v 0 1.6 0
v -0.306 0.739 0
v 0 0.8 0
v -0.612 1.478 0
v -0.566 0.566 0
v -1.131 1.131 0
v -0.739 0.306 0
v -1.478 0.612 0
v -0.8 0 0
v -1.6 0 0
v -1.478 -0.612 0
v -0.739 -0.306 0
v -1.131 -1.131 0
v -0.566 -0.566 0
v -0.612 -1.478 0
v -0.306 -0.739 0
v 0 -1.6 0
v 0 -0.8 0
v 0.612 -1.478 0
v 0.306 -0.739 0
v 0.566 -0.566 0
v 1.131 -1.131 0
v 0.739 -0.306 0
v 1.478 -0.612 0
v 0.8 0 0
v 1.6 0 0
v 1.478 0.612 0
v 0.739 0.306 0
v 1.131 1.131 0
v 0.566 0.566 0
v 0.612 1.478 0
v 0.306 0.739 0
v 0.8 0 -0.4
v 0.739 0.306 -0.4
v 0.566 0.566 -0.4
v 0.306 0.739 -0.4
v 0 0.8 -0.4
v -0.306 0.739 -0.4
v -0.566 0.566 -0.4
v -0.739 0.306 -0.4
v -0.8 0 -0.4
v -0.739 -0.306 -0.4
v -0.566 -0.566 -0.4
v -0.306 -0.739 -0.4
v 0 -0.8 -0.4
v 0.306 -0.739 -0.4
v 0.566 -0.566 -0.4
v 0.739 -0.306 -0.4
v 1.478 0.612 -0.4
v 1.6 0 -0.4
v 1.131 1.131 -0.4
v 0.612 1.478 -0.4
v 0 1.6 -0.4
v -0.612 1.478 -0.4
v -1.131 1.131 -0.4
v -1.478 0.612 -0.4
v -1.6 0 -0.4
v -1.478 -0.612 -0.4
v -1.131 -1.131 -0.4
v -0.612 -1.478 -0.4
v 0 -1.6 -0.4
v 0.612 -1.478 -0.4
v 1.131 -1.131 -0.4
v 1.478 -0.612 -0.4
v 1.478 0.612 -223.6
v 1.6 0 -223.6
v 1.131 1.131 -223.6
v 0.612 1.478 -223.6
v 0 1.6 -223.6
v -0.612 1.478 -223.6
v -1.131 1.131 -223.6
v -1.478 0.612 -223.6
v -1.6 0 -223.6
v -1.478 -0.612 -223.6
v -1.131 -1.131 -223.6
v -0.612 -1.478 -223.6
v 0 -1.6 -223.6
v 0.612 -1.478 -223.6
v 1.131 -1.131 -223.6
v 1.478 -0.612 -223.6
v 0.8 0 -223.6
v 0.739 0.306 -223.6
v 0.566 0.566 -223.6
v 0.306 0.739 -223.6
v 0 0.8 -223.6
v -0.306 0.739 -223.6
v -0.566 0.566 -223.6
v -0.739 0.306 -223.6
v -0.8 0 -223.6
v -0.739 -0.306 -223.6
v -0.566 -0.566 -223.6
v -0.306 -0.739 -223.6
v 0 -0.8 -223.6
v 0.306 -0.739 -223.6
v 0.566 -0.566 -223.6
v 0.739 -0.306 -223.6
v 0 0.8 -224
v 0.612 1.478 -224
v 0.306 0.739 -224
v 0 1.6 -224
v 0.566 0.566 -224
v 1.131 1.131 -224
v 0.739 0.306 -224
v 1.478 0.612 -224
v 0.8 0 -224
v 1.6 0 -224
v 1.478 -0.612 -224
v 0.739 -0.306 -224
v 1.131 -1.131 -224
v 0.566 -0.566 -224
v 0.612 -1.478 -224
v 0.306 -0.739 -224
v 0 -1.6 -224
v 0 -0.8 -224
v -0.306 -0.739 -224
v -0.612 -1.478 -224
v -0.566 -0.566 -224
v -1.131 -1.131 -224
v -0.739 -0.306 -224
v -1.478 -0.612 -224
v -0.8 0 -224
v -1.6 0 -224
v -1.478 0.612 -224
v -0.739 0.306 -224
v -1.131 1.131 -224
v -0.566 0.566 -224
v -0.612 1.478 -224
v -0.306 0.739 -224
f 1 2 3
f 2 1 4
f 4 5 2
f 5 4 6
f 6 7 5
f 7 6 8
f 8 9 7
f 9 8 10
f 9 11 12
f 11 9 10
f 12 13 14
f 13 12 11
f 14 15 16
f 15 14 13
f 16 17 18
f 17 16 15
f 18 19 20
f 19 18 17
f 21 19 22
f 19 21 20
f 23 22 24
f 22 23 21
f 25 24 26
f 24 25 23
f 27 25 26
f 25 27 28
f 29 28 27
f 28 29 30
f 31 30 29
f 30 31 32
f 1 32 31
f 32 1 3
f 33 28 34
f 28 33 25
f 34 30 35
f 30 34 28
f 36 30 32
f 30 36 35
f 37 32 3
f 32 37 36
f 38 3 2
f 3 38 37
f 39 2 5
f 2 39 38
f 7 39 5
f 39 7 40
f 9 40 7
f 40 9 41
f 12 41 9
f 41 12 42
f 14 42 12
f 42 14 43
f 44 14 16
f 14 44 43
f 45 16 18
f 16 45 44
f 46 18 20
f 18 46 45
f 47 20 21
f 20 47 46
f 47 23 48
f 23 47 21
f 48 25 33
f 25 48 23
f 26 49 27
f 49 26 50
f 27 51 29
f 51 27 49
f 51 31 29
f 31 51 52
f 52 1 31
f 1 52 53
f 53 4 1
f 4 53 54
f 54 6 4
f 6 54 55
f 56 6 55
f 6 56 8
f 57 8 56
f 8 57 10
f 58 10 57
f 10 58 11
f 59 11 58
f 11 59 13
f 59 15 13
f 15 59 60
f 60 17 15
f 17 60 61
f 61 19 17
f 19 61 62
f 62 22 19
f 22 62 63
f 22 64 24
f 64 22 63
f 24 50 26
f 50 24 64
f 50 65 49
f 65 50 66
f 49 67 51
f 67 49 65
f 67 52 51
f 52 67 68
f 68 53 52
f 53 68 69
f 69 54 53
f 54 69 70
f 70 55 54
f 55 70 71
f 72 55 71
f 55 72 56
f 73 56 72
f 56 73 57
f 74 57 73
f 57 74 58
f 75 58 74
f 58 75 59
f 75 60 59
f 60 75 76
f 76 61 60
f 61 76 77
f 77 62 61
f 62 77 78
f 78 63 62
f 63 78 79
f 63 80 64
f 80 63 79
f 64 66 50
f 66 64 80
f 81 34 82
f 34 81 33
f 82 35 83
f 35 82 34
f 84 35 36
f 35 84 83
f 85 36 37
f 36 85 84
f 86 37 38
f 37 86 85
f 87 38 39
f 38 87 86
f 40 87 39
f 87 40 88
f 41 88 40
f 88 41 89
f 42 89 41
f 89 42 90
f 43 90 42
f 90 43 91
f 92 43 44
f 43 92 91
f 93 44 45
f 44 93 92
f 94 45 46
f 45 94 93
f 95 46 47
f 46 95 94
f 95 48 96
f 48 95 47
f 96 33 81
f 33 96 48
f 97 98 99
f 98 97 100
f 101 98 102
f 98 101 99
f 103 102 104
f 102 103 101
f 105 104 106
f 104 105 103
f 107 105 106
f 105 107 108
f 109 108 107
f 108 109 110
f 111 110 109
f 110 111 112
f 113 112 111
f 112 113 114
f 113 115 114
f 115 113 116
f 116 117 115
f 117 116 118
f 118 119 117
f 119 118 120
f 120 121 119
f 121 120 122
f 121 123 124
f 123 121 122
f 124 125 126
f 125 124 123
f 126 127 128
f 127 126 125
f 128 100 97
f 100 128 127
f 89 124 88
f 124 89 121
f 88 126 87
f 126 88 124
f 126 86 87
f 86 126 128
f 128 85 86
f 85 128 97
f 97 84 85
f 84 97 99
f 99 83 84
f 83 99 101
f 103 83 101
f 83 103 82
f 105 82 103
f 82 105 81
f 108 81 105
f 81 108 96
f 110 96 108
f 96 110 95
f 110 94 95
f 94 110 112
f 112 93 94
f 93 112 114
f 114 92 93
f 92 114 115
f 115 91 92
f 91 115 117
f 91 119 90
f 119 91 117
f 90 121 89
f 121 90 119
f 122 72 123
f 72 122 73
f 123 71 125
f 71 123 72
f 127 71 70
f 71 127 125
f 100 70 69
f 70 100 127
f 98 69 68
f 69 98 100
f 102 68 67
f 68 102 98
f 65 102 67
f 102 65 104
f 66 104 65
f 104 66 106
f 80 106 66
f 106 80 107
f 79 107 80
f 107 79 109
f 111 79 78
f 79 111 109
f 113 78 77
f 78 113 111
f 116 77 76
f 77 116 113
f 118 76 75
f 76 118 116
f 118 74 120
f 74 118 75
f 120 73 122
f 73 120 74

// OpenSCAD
// file: ../p/4-4ring1.scad
use <../lib.scad>
function ldraw_lib__4_4ring1() = [
// 0 Ring  1 x 1.0
// 0 Name: 4-4ring1.dat
// 0 Author: James Jessiman
// 0 !LDRAW_ORG Primitive UPDATE 2009-01
// 0 !LICENSE Licensed under CC BY 4.0 : see CAreadme.txt
// 
// 0 BFC CERTIFY CCW
  [0,"BFC","CERTIFY"],
  [0,"BFC","CCW"],
// 
// 0 !HISTORY 1998-12-15 [PTadmin] Official Update 1998-10
// 0 !HISTORY 2002-04-08 [BrickCaster] Modified for BFC compliance
// 0 !HISTORY 2002-04-25 [PTadmin] Official Update 2002-02
// 0 !HISTORY 2007-06-24 [PTadmin] Header formatted for Contributor Agreement
// 0 !HISTORY 2008-07-01 [PTadmin] Official Update 2008-01
// 0 !HISTORY 2008-08-26 [cwdee] Switch polygon winding and rename
// 0 !HISTORY 2009-05-02 [PTadmin] Official Update 2009-01
// 
// 
// 4 16 -0.7654 0 1.8478 -0.3827 0 0.9239 0 0 1 0 0 2
  [4,16,-0.7654,0,1.8478,-0.3827,0,0.9239,0,0,1,0,0,2],
// 4 16 -1.4142 0 1.4142 -0.7071 0 0.7071 -0.3827 0 0.9239 -0.7654 0 1.8478
  [4,16,-1.4142,0,1.4142,-0.7071,0,0.7071,-0.3827,0,0.9239,-0.7654,0,1.8478],
// 4 16 -1.8478 0 0.7654 -0.9239 0 0.3827 -0.7071 0 0.7071 -1.4142 0 1.41420
  [4,16,-1.8478,0,0.7654,-0.9239,0,0.3827,-0.7071,0,0.7071,-1.4142,0,1.41420],
// 4 16 -2 0 0 -1 0 0 -0.9239 0 0.3827 -1.8478 0 0.7654
  [4,16,-2,0,0,-1,0,0,-0.9239,0,0.3827,-1.8478,0,0.7654],
// 4 16 -1.8478 0 -0.7654 -0.9239 0 -0.3827 -1 0 0 -2 0 0
  [4,16,-1.8478,0,-0.7654,-0.9239,0,-0.3827,-1,0,0,-2,0,0],
// 4 16 -1.4142 0 -1.4142 -0.7071 0 -0.7071 -0.9239 0 -0.3827 -1.8478 0 -0.7654
  [4,16,-1.4142,0,-1.4142,-0.7071,0,-0.7071,-0.9239,0,-0.3827,-1.8478,0,-0.7654],
// 4 16 -0.7654 0 -1.8478 -0.3827 0 -0.9239 -0.7071 0 -0.7071 -1.4142 0 -1.4142
  [4,16,-0.7654,0,-1.8478,-0.3827,0,-0.9239,-0.7071,0,-0.7071,-1.4142,0,-1.4142],
// 4 16 0 0 -2 0 0 -1 -0.3827 0 -0.9239 -0.7654 0 -1.8478
  [4,16,0,0,-2,0,0,-1,-0.3827,0,-0.9239,-0.7654,0,-1.8478],
// 4 16 0.7654 0 -1.8478 0.3827 0 -0.9239 0 0 -1 0 0 -2
  [4,16,0.7654,0,-1.8478,0.3827,0,-0.9239,0,0,-1,0,0,-2],
// 4 16 1.4142 0 -1.4142 0.7071 0 -0.7071 0.3827 0 -0.9239 0.7654 0 -1.8478
  [4,16,1.4142,0,-1.4142,0.7071,0,-0.7071,0.3827,0,-0.9239,0.7654,0,-1.8478],
// 4 16 1.8478 0 -0.7654 0.9239 0 -0.3827 0.7071 0 -0.7071 1.4142 0 -1.4142
  [4,16,1.8478,0,-0.7654,0.9239,0,-0.3827,0.7071,0,-0.7071,1.4142,0,-1.4142],
// 4 16 2 0 0 1 0 0 0.9239 0 -0.3827 1.8478 0 -0.7654
  [4,16,2,0,0,1,0,0,0.9239,0,-0.3827,1.8478,0,-0.7654],
// 4 16 1.8478 0 0.7654 0.9239 0 0.3827 1 0 0 2 0 0
  [4,16,1.8478,0,0.7654,0.9239,0,0.3827,1,0,0,2,0,0],
// 4 16 1.4142 0 1.4142 0.7071 0 0.7071 0.9239 0 0.3827 1.8478 0 0.7654
  [4,16,1.4142,0,1.4142,0.7071,0,0.7071,0.9239,0,0.3827,1.8478,0,0.7654],
// 4 16 0.7654 0 1.8478 0.3827 0 0.9239 0.7071 0 0.7071 1.4142 0 1.4142
  [4,16,0.7654,0,1.8478,0.3827,0,0.9239,0.7071,0,0.7071,1.4142,0,1.4142],
// 4 16 0 0 2 0 0 1 0.3827 0 0.9239 0.7654 0 1.8478
  [4,16,0,0,2,0,0,1,0.3827,0,0.9239,0.7654,0,1.8478],
// 0
];
module ldraw_lib__4_4ring1(step=0, col=false, unit=2/5, alt=false, line=0.2, solid=!$preview)
    makepoly(ldraw_lib__4_4ring1(), step=step, col=col, unit=unit, alt=alt, line=line, solid=solid);
ldraw_lib__4_4ring1(line=0.2);
// file: ../p/4-4edge.scad
use <../lib.scad>
function ldraw_lib__4_4edge() = [
// 0 Circle 1.0
// 0 Name: 4-4edge.dat
// 0 Author: James Jessiman
// 0 !LDRAW_ORG Primitive UPDATE 2017-01
// 0 !LICENSE Licensed under CC BY 4.0 : see CAreadme.txt
// 
// 0 BFC CERTIFY CCW
  [0,"BFC","CERTIFY"],
  [0,"BFC","CCW"],
// 
// 0 !HISTORY 1998-12-15 [PTadmin] Official Update 1998-10
// 0 !HISTORY 2005-12-28 [PTadmin] Official Update 2005-01
// 0 !HISTORY 2007-06-24 [PTadmin] Header formatted for Contributor Agreement
// 0 !HISTORY 2008-07-01 [PTadmin] Official Update 2008-01
// 0 !HISTORY 2017-01-15 [Steffen] BFCed
// 0 !HISTORY 2017-12-30 [PTadmin] Official Update 2017-01
// 
// 
// 2 24 1 0 0 0.9239 0 0.3827
  [2,24,1,0,0,0.9239,0,0.3827],
// 2 24 0.9239 0 0.3827 0.7071 0 0.7071
  [2,24,0.9239,0,0.3827,0.7071,0,0.7071],
// 2 24 0.7071 0 0.7071 0.3827 0 0.9239
  [2,24,0.7071,0,0.7071,0.3827,0,0.9239],
// 2 24 0.3827 0 0.9239 0 0 1
  [2,24,0.3827,0,0.9239,0,0,1],
// 2 24 0 0 1 -0.3827 0 0.9239
  [2,24,0,0,1,-0.3827,0,0.9239],
// 2 24 -0.3827 0 0.9239 -0.7071 0 0.7071
  [2,24,-0.3827,0,0.9239,-0.7071,0,0.7071],
// 2 24 -0.7071 0 0.7071 -0.9239 0 0.3827
  [2,24,-0.7071,0,0.7071,-0.9239,0,0.3827],
// 2 24 -0.9239 0 0.3827 -1 0 -0
  [2,24,-0.9239,0,0.3827,-1,0,-0],
// 2 24 -1 0 -0 -0.9239 0 -0.3827
  [2,24,-1,0,-0,-0.9239,0,-0.3827],
// 2 24 -0.9239 0 -0.3827 -0.7071 0 -0.7071
  [2,24,-0.9239,0,-0.3827,-0.7071,0,-0.7071],
// 2 24 -0.7071 0 -0.7071 -0.3827 0 -0.9239
  [2,24,-0.7071,0,-0.7071,-0.3827,0,-0.9239],
// 2 24 -0.3827 0 -0.9239 0 0 -1
  [2,24,-0.3827,0,-0.9239,0,0,-1],
// 2 24 0 0 -1 0.3827 0 -0.9239
  [2,24,0,0,-1,0.3827,0,-0.9239],
// 2 24 0.3827 0 -0.9239 0.7071 0 -0.7071
  [2,24,0.3827,0,-0.9239,0.7071,0,-0.7071],
// 2 24 0.7071 0 -0.7071 0.9239 0 -0.3827
  [2,24,0.7071,0,-0.7071,0.9239,0,-0.3827],
// 2 24 0.9239 0 -0.3827 1 0 0
  [2,24,0.9239,0,-0.3827,1,0,0],
];
module ldraw_lib__4_4edge(step=0, col=false, unit=2/5, alt=false, line=0.2, solid=!$preview)
    makepoly(ldraw_lib__4_4edge(), step=step, col=col, unit=unit, alt=alt, line=line, solid=solid);
ldraw_lib__4_4edge(line=0.2);
// file: ../p/4-4cyli.scad
use <../lib.scad>
function ldraw_lib__4_4cyli() = [
// 0 Cylinder 1.0
// 0 Name: 4-4cyli.dat
// 0 Author: James Jessiman
// 0 !LDRAW_ORG Primitive UPDATE 2005-01
// 0 !LICENSE Licensed under CC BY 4.0 : see CAreadme.txt
// 
// 0 BFC CERTIFY CCW
  [0,"BFC","CERTIFY"],
  [0,"BFC","CCW"],
// 
// 0 !HISTORY 1998-12-15 [PTadmin] Official Update 1998-10
// 0 !HISTORY 2002-03-23 [sbliss] Added BFC statement; merged headers from files in distributions LDraw 0.27 and Complete.
// 0 !HISTORY 2002-04-25 [PTadmin] Official Update 2002-02
// 0 !HISTORY 2004-12-14 [guyvivan] BFC CCW
// 0 !HISTORY 2005-12-28 [PTadmin] Official Update 2005-01
// 0 !HISTORY 2007-06-24 [PTadmin] Header formatted for Contributor Agreement
// 0 !HISTORY 2008-07-01 [PTadmin] Official Update 2008-01
// 
// 
// 4 16 1 1 0 0.9239 1 0.3827 0.9239 0 0.3827 1 0 0
  [4,16,1,1,0,0.9239,1,0.3827,0.9239,0,0.3827,1,0,0],
// 5 24 1 0 0 1 1 0 0.9239 0 0.3827 0.9239 0 -0.3827
  [5,24,1,0,0,1,1,0,0.9239,0,0.3827,0.9239,0,-0.3827],
// 4 16 0.9239 1 0.3827 0.7071 1 0.7071 0.7071 0 0.7071 0.9239 0 0.3827
  [4,16,0.9239,1,0.3827,0.7071,1,0.7071,0.7071,0,0.7071,0.9239,0,0.3827],
// 5 24 0.9239 0 0.3827 0.9239 1 0.3827 0.7071 0 0.7071 1 0 0
  [5,24,0.9239,0,0.3827,0.9239,1,0.3827,0.7071,0,0.7071,1,0,0],
// 4 16 0.7071 1 0.7071 0.3827 1 0.9239 0.3827 0 0.9239 0.7071 0 0.7071
  [4,16,0.7071,1,0.7071,0.3827,1,0.9239,0.3827,0,0.9239,0.7071,0,0.7071],
// 5 24 0.7071 0 0.7071 0.7071 1 0.7071 0.3827 0 0.9239 0.9239 0 0.3827
  [5,24,0.7071,0,0.7071,0.7071,1,0.7071,0.3827,0,0.9239,0.9239,0,0.3827],
// 4 16 0.3827 1 0.9239 0 1 1 0 0 1 0.3827 0 0.9239
  [4,16,0.3827,1,0.9239,0,1,1,0,0,1,0.3827,0,0.9239],
// 5 24 0.3827 0 0.9239 0.3827 1 0.9239 0 0 1 0.7071 0 0.7071
  [5,24,0.3827,0,0.9239,0.3827,1,0.9239,0,0,1,0.7071,0,0.7071],
// 4 16 0 1 1 -0.3827 1 0.9239 -0.3827 0 0.9239 0 0 1
  [4,16,0,1,1,-0.3827,1,0.9239,-0.3827,0,0.9239,0,0,1],
// 5 24 0 0 1 0 1 1 -0.3827 0 0.9239 0.3827 0 0.9239
  [5,24,0,0,1,0,1,1,-0.3827,0,0.9239,0.3827,0,0.9239],
// 4 16 -0.3827 1 0.9239 -0.7071 1 0.7071 -0.7071 0 0.7071 -0.3827 0 0.9239
  [4,16,-0.3827,1,0.9239,-0.7071,1,0.7071,-0.7071,0,0.7071,-0.3827,0,0.9239],
// 5 24 -0.3827 0 0.9239 -0.3827 1 0.9239 -0.7071 0 0.7071 0 0 1
  [5,24,-0.3827,0,0.9239,-0.3827,1,0.9239,-0.7071,0,0.7071,0,0,1],
// 4 16 -0.7071 1 0.7071 -0.9239 1 0.3827 -0.9239 0 0.3827 -0.7071 0 0.7071
  [4,16,-0.7071,1,0.7071,-0.9239,1,0.3827,-0.9239,0,0.3827,-0.7071,0,0.7071],
// 5 24 -0.7071 0 0.7071 -0.7071 1 0.7071 -0.9239 0 0.3827 -0.3827 0 0.9239
  [5,24,-0.7071,0,0.7071,-0.7071,1,0.7071,-0.9239,0,0.3827,-0.3827,0,0.9239],
// 4 16 -0.9239 1 0.3827 -1 1 0 -1 0 0 -0.9239 0 0.3827
  [4,16,-0.9239,1,0.3827,-1,1,0,-1,0,0,-0.9239,0,0.3827],
// 5 24 -0.9239 0 0.3827 -0.9239 1 0.3827 -1 0 0 -0.7071 0 0.7071
  [5,24,-0.9239,0,0.3827,-0.9239,1,0.3827,-1,0,0,-0.7071,0,0.7071],
// 4 16 -1 1 0 -0.9239 1 -0.3827 -0.9239 0 -0.3827 -1 0 0
  [4,16,-1,1,0,-0.9239,1,-0.3827,-0.9239,0,-0.3827,-1,0,0],
// 5 24 -1 0 0 -1 1 0 -0.9239 0 -0.3827 -0.9239 0 0.3827
  [5,24,-1,0,0,-1,1,0,-0.9239,0,-0.3827,-0.9239,0,0.3827],
// 4 16 -0.9239 1 -0.3827 -0.7071 1 -0.7071 -0.7071 0 -0.7071 -0.9239 0 -0.3827
  [4,16,-0.9239,1,-0.3827,-0.7071,1,-0.7071,-0.7071,0,-0.7071,-0.9239,0,-0.3827],
// 5 24 -0.9239 0 -0.3827 -0.9239 1 -0.3827 -0.7071 0 -0.7071 -1 0 0
  [5,24,-0.9239,0,-0.3827,-0.9239,1,-0.3827,-0.7071,0,-0.7071,-1,0,0],
// 4 16 -0.7071 1 -0.7071 -0.3827 1 -0.9239 -0.3827 0 -0.9239 -0.7071 0 -0.7071
  [4,16,-0.7071,1,-0.7071,-0.3827,1,-0.9239,-0.3827,0,-0.9239,-0.7071,0,-0.7071],
// 5 24 -0.7071 0 -0.7071 -0.7071 1 -0.7071 -0.3827 0 -0.9239 -0.9239 0 -0.3827
  [5,24,-0.7071,0,-0.7071,-0.7071,1,-0.7071,-0.3827,0,-0.9239,-0.9239,0,-0.3827],
// 4 16 -0.3827 1 -0.9239 0 1 -1 0 0 -1 -0.3827 0 -0.9239
  [4,16,-0.3827,1,-0.9239,0,1,-1,0,0,-1,-0.3827,0,-0.9239],
// 5 24 -0.3827 0 -0.9239 -0.3827 1 -0.9239 0 0 -1 -0.7071 0 -0.7071
  [5,24,-0.3827,0,-0.9239,-0.3827,1,-0.9239,0,0,-1,-0.7071,0,-0.7071],
// 4 16 0 1 -1 0.3827 1 -0.9239 0.3827 0 -0.9239 0 0 -1
  [4,16,0,1,-1,0.3827,1,-0.9239,0.3827,0,-0.9239,0,0,-1],
// 5 24 0 0 -1 0 1 -1 0.3827 0 -0.9239 -0.3827 0 -0.9239
  [5,24,0,0,-1,0,1,-1,0.3827,0,-0.9239,-0.3827,0,-0.9239],
// 4 16 0.3827 1 -0.9239 0.7071 1 -0.7071 0.7071 0 -0.7071 0.3827 0 -0.9239
  [4,16,0.3827,1,-0.9239,0.7071,1,-0.7071,0.7071,0,-0.7071,0.3827,0,-0.9239],
// 5 24 0.3827 0 -0.9239 0.3827 1 -0.9239 0.7071 0 -0.7071 0 0 -1
  [5,24,0.3827,0,-0.9239,0.3827,1,-0.9239,0.7071,0,-0.7071,0,0,-1],
// 4 16 0.7071 1 -0.7071 0.9239 1 -0.3827 0.9239 0 -0.3827 0.7071 0 -0.7071
  [4,16,0.7071,1,-0.7071,0.9239,1,-0.3827,0.9239,0,-0.3827,0.7071,0,-0.7071],
// 5 24 0.7071 0 -0.7071 0.7071 1 -0.7071 0.9239 0 -0.3827 0.3827 0 -0.9239
  [5,24,0.7071,0,-0.7071,0.7071,1,-0.7071,0.9239,0,-0.3827,0.3827,0,-0.9239],
// 4 16 0.9239 1 -0.3827 1 1 0 1 0 0 0.9239 0 -0.3827
  [4,16,0.9239,1,-0.3827,1,1,0,1,0,0,0.9239,0,-0.3827],
// 5 24 0.9239 0 -0.3827 0.9239 1 -0.3827 1 0 0 0.7071 0 -0.7071
  [5,24,0.9239,0,-0.3827,0.9239,1,-0.3827,1,0,0,0.7071,0,-0.7071],
// 0
];
module ldraw_lib__4_4cyli(step=0, col=false, unit=2/5, alt=false, line=0.2, solid=!$preview)
    makepoly(ldraw_lib__4_4cyli(), step=step, col=col, unit=unit, alt=alt, line=line, solid=solid);
ldraw_lib__4_4cyli(line=0.2);
// file: u9053.scad
use <../lib.scad>
use <../p/4-4cyli.scad>
use <../p/4-4edge.scad>
use <../p/4-4ring1.scad>
function ldraw_lib__u9053() = [
// 0 ~Technic Flex-System Hose End
// 0 Name: u9053.dat
// 0 Author: William Howard [WilliamH]
// 0 !LDRAW_ORG Part UPDATE 2011-02
// 0 !LICENSE Licensed under CC BY 2.0 and CC BY 4.0 : see CAreadme.txt
// 
// 0 BFC CERTIFY CCW
  [0,"BFC","CERTIFY"],
  [0,"BFC","CCW"],
// 
// 0 !HISTORY 2011-12-21 [cwdee] Reworked subparting technique
// 0 !HISTORY 2011-12-23 [PTadmin] Renamed from 76
// 0 !HISTORY 2011-12-29 [PTadmin] Official Update 2011-02
// 
// 
// 1 16 0 0 0 2 0 0 0 1 0 0 0 2 4-4ring1.dat
  [1,16,0,0,0,2,0,0,0,1,0,0,0,2, ldraw_lib__4_4ring1()],
// 1 16 0 0 0 2 0 0 0 1 0 0 0 2 4-4edge.dat
  [1,16,0,0,0,2,0,0,0,1,0,0,0,2, ldraw_lib__4_4edge()],
// 0 BFC INVERTNEXT
  [0,"BFC","INVERTNEXT"],
// 1 16 0 0 0 2 0 0 0 1 0 0 0 2 4-4cyli.dat
  [1,16,0,0,0,2,0,0,0,1,0,0,0,2, ldraw_lib__4_4cyli()],
// 1 16 0 0 0 4 0 0 0 1 0 0 0 4 4-4edge.dat
  [1,16,0,0,0,4,0,0,0,1,0,0,0,4, ldraw_lib__4_4edge()],
// 1 16 0 0 0 4 0 0 0 1 0 0 0 4 4-4cyli.dat
  [1,16,0,0,0,4,0,0,0,1,0,0,0,4, ldraw_lib__4_4cyli()],
// 0
];
module ldraw_lib__u9053(step=0, col=false, unit=2/5, alt=false, line=0.2, solid=!$preview)
    makepoly(ldraw_lib__u9053(), step=step, col=col, unit=unit, alt=alt, line=line, solid=solid);
ldraw_lib__u9053(line=0.2);
// file: 77.scad
use <../lib.scad>
use <../p/4-4cyli.scad>
function ldraw_lib__77() = [
// 0 ~Technic Flex-System Hose Segment
// 0 Name: 77.dat
// 0 Author: William Howard [WilliamH]
// 0 !LDRAW_ORG Part UPDATE 2011-02
// 0 !LICENSE Licensed under CC BY 2.0 and CC BY 4.0 : see CAreadme.txt
// 
// 0 BFC CERTIFY CCW
  [0,"BFC","CERTIFY"],
  [0,"BFC","CCW"],
// 
// 0 !HISTORY 2011-12-21 [cwdee] Reworked subparting technique
// 0 !HISTORY 2011-12-29 [PTadmin] Official Update 2011-02
// 
// 
// 1 16 0 0 0 4 0 0 0 1 0 0 0 4 4-4cyli.dat
  [1,16,0,0,0,4,0,0,0,1,0,0,0,4, ldraw_lib__4_4cyli()],
// 0 BFC INVERTNEXT
  [0,"BFC","INVERTNEXT"],
// 1 16 0 0 0 2 0 0 0 1 0 0 0 2 4-4cyli.dat
  [1,16,0,0,0,2,0,0,0,1,0,0,0,2, ldraw_lib__4_4cyli()],
// 0
];
module ldraw_lib__77(step=0, col=false, unit=2/5, alt=false, line=0.2, solid=!$preview)
    makepoly(ldraw_lib__77(), step=step, col=col, unit=unit, alt=alt, line=line, solid=solid);
ldraw_lib__77(line=0.2);
// main file
use <../lib.scad>
use <77.scad>
use <u9053.scad>
function ldraw_lib__76280() = [
// 0 Technic Flex-System Hose 28L (560LDU)
// 0 Name: 76280.dat
// 0 Author: Tim Gould [timgould]
// 0 !LDRAW_ORG Part UPDATE 2011-02
// 0 !LICENSE Licensed under CC BY 4.0 : see CAreadme.txt
// 
// 0 BFC CERTIFY CCW
  [0,"BFC","CERTIFY"],
  [0,"BFC","CCW"],
// 
// 0 !KEYWORDS bar, BrickLink 75c28, Rebrickable 75c28, tube
// 
// 0 !HISTORY 2011-12-29 [PTadmin] Official Update 2011-02
// 
// 
// 1 16 0 0 0 1 0 0 0 1 0 0 0 1 u9053.dat
  [1,16,0,0,0,1,0,0,0,1,0,0,0,1, ldraw_lib__u9053()],
// 1 16 0 1 0 1 0 0 0 558 0 0 0 1 77.dat
  [1,16,0,1,0,1,0,0,0,558,0,0,0,1, ldraw_lib__77()],
// 1 16 0 560 0 -1 0 0 0 -1 0 0 0 1 u9053.dat
  [1,16,0,560,0,-1,0,0,0,-1,0,0,0,1, ldraw_lib__u9053()],
];
module ldraw_lib__76280(step=0, col=false, unit=2/5, alt=false, line=0.2, solid=!$preview)
    makepoly(ldraw_lib__76280(), step=step, col=col, unit=unit, alt=alt, line=line, solid=solid);
ldraw_lib__76280(line=0.2);
